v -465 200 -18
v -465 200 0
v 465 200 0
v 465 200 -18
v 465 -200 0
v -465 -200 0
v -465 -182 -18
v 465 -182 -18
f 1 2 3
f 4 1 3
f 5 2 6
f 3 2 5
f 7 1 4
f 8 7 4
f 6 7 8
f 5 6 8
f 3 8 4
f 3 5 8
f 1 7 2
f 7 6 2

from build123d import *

# Parameters (mm, degrees)
F0_W     = 930
F0_H     = 400
F1_DEPTH = 18
F2_SIZE  = 17.99999


# Not quite as in the source:
# - a fillet or chamfer is up to 0.001 mm smaller than in the source, because OpenCascade refuses the exact size


with BuildPart() as f1:
    # F0 (on Top) → F1 (new body)
    with BuildSketch(Plane.XY):
        Rectangle(F0_W, F0_H)
    extrude(amount=-F1_DEPTH)

    # F2 (size 18 in the source; OpenCascade refuses exactly that, so slightly less here)
    f2_edges = [f1.edges().sort_by_distance(p)[0] for p in [
        (0, -200, -18),
    ]]
    chamfer(f2_edges, length=F2_SIZE)


solid = f1.part
